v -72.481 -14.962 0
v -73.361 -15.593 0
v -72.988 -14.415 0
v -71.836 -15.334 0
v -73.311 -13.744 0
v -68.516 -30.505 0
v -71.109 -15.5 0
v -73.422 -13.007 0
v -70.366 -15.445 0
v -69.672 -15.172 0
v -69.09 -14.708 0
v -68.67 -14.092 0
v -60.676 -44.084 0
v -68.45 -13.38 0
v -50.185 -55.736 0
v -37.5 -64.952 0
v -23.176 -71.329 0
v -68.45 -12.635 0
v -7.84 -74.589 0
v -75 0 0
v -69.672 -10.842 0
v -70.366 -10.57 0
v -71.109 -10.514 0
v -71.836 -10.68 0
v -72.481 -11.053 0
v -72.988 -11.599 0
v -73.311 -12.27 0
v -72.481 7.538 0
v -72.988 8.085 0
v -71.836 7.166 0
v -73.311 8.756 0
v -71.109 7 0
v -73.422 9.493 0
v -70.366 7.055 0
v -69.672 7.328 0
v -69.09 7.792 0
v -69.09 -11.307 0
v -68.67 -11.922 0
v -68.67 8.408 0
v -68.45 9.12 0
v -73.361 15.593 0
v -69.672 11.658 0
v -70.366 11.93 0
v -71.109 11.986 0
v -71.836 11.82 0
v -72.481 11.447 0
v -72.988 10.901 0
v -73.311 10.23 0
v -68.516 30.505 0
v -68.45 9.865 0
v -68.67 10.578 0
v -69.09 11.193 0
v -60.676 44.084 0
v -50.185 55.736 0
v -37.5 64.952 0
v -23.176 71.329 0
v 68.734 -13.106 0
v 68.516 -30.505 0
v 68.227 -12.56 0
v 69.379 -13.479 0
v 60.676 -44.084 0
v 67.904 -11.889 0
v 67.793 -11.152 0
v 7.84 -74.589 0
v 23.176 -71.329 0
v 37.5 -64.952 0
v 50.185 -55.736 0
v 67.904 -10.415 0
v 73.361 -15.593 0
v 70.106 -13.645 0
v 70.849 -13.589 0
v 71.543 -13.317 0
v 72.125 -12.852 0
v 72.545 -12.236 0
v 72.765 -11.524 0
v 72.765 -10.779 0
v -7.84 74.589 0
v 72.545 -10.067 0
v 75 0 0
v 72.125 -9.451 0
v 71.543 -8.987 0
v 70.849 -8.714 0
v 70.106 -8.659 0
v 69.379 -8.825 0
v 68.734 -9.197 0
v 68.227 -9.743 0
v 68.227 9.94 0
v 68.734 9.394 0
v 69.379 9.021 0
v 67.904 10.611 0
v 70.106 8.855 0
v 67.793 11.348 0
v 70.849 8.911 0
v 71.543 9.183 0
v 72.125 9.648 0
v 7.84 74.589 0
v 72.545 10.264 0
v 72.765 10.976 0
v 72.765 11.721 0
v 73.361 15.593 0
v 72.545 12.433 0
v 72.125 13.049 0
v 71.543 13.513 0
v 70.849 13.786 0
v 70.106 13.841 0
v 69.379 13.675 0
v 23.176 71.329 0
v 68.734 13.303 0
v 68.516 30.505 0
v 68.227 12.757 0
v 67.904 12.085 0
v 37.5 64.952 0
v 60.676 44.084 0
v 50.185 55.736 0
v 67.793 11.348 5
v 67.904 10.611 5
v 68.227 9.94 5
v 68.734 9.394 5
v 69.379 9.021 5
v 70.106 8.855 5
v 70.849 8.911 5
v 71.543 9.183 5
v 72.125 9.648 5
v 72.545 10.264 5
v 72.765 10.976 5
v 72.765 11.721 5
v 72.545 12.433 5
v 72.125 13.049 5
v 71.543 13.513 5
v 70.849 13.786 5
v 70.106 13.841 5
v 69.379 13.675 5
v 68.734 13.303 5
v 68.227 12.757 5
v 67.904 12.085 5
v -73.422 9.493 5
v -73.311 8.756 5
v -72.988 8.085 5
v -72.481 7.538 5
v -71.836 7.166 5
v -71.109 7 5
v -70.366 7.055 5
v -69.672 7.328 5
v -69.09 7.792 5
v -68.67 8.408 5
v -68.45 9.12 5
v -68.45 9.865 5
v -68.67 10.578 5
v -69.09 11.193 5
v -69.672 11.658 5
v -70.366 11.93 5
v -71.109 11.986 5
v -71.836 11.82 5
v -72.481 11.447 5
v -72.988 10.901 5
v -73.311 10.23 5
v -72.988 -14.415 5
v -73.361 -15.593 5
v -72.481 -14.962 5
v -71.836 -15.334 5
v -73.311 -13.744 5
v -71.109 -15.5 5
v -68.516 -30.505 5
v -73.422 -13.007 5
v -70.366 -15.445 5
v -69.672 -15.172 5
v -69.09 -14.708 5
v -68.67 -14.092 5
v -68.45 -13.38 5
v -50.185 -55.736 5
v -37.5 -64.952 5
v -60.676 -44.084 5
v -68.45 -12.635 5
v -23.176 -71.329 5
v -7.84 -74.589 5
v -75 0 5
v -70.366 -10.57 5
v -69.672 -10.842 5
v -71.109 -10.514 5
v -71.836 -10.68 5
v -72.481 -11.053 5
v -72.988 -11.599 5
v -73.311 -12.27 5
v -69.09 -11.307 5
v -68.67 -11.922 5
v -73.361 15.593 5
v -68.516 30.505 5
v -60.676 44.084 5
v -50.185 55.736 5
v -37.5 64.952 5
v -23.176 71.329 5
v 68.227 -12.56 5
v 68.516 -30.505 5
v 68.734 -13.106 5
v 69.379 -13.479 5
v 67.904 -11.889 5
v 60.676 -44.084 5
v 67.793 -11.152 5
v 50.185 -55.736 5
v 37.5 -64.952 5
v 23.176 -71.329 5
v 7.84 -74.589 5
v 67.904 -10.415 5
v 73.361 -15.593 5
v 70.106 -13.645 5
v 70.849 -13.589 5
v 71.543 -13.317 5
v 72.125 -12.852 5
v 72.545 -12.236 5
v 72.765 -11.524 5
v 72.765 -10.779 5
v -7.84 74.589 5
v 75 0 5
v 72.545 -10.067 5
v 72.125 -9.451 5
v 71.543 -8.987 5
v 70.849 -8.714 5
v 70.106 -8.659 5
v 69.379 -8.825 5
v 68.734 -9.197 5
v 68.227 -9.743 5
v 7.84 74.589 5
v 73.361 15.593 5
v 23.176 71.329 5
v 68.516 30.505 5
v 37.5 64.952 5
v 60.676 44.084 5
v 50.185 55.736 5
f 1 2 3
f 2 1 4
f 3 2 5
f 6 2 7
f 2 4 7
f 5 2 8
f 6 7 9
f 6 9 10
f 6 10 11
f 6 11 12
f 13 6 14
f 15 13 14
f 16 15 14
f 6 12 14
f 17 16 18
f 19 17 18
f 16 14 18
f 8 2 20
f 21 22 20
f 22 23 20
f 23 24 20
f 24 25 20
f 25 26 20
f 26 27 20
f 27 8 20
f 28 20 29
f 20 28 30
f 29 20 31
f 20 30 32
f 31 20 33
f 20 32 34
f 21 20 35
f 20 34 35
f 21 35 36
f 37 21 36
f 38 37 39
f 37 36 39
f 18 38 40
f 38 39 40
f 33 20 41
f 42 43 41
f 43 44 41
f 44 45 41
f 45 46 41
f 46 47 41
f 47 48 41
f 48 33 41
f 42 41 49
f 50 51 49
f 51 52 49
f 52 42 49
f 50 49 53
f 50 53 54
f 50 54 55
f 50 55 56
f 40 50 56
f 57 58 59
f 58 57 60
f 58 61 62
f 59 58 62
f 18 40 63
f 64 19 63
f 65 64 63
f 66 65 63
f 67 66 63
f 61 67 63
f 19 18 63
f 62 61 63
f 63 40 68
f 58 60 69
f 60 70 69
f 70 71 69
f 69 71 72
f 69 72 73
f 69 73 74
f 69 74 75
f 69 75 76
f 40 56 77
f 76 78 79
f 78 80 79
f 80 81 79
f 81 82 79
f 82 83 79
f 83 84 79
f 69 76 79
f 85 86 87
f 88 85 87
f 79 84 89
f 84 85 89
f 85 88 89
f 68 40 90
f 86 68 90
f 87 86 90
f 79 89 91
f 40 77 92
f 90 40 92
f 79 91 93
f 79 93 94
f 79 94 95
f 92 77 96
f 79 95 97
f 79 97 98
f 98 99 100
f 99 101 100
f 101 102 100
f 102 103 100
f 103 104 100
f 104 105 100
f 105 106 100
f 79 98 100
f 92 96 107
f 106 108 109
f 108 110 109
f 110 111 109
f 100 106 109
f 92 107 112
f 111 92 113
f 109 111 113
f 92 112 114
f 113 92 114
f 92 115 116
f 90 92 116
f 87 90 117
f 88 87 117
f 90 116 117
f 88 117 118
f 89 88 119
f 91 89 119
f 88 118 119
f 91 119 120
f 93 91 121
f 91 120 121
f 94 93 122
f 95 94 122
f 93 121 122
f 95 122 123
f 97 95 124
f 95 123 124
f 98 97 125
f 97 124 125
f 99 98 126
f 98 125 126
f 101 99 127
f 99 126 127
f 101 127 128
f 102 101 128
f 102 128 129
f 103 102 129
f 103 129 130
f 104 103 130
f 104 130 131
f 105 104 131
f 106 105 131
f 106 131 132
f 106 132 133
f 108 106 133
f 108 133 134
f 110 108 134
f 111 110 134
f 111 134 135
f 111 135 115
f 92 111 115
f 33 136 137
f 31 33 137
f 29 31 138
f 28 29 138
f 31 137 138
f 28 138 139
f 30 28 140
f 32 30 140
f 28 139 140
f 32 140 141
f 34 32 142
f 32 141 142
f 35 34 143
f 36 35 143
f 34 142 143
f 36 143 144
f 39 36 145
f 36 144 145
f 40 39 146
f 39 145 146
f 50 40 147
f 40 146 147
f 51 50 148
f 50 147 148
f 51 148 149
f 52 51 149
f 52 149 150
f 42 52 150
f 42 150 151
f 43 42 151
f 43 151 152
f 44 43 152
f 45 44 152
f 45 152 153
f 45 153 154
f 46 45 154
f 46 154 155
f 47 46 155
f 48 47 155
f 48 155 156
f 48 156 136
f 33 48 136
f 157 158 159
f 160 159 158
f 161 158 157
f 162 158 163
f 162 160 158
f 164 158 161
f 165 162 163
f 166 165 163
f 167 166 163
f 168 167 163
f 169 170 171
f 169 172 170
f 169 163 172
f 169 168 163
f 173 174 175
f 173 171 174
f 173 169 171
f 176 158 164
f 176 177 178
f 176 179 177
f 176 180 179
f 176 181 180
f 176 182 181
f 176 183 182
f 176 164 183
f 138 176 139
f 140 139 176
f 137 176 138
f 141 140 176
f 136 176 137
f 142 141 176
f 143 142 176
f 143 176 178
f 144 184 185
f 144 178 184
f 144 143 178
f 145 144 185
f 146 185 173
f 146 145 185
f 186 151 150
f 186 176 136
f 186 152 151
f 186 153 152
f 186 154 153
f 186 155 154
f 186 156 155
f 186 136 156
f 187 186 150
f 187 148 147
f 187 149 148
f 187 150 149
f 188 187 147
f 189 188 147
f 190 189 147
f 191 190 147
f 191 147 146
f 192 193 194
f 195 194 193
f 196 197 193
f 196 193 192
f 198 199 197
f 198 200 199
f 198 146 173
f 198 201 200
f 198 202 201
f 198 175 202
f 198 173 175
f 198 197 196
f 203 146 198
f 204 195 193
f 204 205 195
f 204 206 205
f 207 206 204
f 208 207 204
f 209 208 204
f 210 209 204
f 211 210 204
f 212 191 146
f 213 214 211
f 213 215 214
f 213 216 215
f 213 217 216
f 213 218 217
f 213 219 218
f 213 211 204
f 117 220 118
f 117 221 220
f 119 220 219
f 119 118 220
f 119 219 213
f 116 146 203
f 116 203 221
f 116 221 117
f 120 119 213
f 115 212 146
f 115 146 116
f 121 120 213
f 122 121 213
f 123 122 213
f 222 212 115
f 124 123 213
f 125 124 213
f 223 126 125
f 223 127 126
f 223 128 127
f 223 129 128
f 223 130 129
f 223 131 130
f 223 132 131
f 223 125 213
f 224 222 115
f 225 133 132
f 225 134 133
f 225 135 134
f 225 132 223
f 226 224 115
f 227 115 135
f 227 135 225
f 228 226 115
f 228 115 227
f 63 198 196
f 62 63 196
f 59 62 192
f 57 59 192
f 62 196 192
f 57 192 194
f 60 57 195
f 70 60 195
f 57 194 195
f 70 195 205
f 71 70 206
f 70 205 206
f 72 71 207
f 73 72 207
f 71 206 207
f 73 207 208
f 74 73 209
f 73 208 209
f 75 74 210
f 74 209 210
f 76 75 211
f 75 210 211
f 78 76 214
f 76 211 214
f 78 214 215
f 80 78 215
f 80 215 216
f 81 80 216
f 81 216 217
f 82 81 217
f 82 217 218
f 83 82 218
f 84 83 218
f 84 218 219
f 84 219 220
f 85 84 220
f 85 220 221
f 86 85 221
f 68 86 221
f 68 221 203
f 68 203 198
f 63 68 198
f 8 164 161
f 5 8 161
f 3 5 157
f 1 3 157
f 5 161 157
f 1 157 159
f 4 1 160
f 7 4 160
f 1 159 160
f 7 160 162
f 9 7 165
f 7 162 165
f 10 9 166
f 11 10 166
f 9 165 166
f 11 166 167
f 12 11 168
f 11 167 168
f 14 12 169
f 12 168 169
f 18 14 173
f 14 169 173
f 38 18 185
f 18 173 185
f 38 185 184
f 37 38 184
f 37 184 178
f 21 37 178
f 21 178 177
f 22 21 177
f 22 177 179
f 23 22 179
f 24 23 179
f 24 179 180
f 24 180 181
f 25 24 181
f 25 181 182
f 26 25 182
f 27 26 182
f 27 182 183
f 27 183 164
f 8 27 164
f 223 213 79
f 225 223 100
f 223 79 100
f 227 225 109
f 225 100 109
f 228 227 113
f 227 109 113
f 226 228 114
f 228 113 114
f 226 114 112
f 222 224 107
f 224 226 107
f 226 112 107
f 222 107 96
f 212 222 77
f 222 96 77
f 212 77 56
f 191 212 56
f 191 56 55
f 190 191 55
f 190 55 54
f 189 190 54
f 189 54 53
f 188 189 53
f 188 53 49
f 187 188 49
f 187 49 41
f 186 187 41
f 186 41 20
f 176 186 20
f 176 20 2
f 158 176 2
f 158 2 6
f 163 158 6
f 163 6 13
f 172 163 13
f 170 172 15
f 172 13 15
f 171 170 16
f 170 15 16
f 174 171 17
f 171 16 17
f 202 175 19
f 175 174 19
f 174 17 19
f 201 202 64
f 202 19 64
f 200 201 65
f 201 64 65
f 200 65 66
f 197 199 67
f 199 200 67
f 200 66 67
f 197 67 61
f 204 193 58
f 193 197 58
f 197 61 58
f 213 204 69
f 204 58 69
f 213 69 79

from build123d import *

# Parameters (mm, degrees)
F0_R       = 75
F1_DEPTH   = 5
F5_D       = 5
F5_ON_F2_D = 5


with BuildPart() as f1:
    # F0 (on Top) → F1 (new body)
    with BuildSketch(Plane.XY):
        Circle(F0_R)
    extrude(amount=F1_DEPTH)

    # F3: F1 across plane


with BuildPart() as f1_1:
    add(f1.part)
    add(f1.part.mirror(Plane.YZ))

    # F5 (through all)
    with Locations(Plane(origin=(0, 0, 0), x_dir=(1, 0, 0), z_dir=(0, 0, -1))):
        with Locations((-70.9224045277, -9.4928164221), (-70.9224045277, 13.0071835779)):
            Hole(F5_D / 2)

    # F5 on F2 (through all)
    with Locations(Plane(origin=(0, 0, 0), x_dir=(1, 0, 0), z_dir=(0, 0, -1))):
        with Locations((70.2925920486, -11.3482945785), (70.2925920486, 11.1517054215)):
            Hole(F5_ON_F2_D / 2)


solid = f1_1.part
